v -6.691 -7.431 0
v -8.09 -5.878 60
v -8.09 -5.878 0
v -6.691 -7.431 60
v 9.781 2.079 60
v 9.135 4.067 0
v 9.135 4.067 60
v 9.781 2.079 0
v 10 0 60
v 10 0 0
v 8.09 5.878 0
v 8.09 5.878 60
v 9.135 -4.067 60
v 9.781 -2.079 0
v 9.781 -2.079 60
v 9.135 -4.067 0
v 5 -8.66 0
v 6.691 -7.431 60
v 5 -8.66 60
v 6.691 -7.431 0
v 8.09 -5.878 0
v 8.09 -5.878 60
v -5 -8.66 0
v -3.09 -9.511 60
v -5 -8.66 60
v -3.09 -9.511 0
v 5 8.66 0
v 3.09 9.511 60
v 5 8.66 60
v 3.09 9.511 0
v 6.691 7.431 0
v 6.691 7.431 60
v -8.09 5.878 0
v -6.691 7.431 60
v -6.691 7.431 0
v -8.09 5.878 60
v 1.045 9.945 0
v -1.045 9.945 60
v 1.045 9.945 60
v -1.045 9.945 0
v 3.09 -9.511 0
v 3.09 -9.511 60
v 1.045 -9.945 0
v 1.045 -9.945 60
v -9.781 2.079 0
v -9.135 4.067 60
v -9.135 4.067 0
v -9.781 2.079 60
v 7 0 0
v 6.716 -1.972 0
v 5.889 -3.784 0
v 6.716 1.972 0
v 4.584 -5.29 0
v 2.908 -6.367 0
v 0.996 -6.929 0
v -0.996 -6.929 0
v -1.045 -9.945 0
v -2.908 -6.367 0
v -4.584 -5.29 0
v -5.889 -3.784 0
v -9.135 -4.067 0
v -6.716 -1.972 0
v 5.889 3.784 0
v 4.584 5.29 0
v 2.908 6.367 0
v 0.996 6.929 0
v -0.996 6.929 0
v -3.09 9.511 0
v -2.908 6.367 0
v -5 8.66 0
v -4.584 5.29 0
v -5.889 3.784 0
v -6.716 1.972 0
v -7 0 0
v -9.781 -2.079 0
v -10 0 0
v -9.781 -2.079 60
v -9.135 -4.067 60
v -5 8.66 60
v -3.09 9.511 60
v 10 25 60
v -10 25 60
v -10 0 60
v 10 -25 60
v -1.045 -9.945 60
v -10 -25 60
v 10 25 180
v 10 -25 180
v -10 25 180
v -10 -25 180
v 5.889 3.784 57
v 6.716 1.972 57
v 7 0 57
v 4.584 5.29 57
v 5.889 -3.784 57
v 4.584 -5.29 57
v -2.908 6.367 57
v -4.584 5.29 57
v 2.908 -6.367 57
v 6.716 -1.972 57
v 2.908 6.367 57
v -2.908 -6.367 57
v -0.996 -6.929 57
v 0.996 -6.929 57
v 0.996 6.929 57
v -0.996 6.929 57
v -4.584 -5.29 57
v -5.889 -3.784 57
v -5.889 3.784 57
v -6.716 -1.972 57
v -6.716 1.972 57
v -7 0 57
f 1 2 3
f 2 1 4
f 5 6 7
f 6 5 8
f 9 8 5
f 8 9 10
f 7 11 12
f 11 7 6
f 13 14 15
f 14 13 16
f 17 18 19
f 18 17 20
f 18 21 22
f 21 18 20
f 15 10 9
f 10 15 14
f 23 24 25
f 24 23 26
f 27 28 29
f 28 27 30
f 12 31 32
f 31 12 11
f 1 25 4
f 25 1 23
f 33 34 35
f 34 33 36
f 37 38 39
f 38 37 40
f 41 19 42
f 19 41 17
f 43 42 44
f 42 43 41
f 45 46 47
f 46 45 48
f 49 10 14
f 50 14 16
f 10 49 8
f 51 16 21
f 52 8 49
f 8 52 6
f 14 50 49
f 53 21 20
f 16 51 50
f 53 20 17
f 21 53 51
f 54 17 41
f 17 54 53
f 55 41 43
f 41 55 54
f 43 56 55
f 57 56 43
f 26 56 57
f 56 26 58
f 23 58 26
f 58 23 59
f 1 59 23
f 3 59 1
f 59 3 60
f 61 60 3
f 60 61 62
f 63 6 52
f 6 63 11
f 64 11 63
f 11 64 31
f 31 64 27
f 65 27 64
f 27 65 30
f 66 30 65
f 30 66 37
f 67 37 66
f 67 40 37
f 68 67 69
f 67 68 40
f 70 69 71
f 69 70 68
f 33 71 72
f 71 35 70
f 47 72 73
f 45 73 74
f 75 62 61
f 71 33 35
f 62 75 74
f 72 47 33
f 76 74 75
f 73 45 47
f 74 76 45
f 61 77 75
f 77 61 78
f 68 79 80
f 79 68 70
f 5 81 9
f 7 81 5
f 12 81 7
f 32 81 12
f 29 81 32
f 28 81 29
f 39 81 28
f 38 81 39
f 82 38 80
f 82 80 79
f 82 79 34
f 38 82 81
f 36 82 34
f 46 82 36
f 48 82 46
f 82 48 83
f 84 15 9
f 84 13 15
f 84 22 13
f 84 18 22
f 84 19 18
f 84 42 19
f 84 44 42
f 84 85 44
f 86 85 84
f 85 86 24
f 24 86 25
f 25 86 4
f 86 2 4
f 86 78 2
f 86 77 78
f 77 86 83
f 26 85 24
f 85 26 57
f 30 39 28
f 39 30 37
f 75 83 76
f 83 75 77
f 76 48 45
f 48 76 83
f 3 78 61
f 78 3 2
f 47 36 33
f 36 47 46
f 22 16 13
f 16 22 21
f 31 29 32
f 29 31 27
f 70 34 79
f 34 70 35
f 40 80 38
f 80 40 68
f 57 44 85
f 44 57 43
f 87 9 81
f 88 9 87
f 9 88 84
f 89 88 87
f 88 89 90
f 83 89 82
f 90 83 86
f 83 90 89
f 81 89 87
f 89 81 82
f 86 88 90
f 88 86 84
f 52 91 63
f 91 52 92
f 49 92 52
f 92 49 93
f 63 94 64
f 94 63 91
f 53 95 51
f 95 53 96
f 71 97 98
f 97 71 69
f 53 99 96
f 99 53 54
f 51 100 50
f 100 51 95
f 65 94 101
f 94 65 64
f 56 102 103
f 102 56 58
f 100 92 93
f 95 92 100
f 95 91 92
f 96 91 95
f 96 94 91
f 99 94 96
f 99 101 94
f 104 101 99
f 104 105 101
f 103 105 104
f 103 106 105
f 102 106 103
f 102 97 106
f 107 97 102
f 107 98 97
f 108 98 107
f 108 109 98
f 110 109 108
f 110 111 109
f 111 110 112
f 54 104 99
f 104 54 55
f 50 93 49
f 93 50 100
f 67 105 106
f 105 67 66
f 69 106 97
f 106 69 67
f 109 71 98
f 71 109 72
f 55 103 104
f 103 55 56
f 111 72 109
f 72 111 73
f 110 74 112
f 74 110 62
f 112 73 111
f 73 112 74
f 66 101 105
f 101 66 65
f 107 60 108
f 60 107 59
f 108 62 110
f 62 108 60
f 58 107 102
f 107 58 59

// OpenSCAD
atachment_radias = 10;


atachment_height = 60;


skeawer_width = atachment_radias-3;




difference(){
  union(){
    cylinder(r=atachment_radias,h=atachment_height);
    translate([0,0,atachment_height*2])
    cube([atachment_radias*2,atachment_radias*5,atachment_height*2],center=true);
    }
    
    
    
  cylinder(r=skeawer_width , h=atachment_height-3);
}
